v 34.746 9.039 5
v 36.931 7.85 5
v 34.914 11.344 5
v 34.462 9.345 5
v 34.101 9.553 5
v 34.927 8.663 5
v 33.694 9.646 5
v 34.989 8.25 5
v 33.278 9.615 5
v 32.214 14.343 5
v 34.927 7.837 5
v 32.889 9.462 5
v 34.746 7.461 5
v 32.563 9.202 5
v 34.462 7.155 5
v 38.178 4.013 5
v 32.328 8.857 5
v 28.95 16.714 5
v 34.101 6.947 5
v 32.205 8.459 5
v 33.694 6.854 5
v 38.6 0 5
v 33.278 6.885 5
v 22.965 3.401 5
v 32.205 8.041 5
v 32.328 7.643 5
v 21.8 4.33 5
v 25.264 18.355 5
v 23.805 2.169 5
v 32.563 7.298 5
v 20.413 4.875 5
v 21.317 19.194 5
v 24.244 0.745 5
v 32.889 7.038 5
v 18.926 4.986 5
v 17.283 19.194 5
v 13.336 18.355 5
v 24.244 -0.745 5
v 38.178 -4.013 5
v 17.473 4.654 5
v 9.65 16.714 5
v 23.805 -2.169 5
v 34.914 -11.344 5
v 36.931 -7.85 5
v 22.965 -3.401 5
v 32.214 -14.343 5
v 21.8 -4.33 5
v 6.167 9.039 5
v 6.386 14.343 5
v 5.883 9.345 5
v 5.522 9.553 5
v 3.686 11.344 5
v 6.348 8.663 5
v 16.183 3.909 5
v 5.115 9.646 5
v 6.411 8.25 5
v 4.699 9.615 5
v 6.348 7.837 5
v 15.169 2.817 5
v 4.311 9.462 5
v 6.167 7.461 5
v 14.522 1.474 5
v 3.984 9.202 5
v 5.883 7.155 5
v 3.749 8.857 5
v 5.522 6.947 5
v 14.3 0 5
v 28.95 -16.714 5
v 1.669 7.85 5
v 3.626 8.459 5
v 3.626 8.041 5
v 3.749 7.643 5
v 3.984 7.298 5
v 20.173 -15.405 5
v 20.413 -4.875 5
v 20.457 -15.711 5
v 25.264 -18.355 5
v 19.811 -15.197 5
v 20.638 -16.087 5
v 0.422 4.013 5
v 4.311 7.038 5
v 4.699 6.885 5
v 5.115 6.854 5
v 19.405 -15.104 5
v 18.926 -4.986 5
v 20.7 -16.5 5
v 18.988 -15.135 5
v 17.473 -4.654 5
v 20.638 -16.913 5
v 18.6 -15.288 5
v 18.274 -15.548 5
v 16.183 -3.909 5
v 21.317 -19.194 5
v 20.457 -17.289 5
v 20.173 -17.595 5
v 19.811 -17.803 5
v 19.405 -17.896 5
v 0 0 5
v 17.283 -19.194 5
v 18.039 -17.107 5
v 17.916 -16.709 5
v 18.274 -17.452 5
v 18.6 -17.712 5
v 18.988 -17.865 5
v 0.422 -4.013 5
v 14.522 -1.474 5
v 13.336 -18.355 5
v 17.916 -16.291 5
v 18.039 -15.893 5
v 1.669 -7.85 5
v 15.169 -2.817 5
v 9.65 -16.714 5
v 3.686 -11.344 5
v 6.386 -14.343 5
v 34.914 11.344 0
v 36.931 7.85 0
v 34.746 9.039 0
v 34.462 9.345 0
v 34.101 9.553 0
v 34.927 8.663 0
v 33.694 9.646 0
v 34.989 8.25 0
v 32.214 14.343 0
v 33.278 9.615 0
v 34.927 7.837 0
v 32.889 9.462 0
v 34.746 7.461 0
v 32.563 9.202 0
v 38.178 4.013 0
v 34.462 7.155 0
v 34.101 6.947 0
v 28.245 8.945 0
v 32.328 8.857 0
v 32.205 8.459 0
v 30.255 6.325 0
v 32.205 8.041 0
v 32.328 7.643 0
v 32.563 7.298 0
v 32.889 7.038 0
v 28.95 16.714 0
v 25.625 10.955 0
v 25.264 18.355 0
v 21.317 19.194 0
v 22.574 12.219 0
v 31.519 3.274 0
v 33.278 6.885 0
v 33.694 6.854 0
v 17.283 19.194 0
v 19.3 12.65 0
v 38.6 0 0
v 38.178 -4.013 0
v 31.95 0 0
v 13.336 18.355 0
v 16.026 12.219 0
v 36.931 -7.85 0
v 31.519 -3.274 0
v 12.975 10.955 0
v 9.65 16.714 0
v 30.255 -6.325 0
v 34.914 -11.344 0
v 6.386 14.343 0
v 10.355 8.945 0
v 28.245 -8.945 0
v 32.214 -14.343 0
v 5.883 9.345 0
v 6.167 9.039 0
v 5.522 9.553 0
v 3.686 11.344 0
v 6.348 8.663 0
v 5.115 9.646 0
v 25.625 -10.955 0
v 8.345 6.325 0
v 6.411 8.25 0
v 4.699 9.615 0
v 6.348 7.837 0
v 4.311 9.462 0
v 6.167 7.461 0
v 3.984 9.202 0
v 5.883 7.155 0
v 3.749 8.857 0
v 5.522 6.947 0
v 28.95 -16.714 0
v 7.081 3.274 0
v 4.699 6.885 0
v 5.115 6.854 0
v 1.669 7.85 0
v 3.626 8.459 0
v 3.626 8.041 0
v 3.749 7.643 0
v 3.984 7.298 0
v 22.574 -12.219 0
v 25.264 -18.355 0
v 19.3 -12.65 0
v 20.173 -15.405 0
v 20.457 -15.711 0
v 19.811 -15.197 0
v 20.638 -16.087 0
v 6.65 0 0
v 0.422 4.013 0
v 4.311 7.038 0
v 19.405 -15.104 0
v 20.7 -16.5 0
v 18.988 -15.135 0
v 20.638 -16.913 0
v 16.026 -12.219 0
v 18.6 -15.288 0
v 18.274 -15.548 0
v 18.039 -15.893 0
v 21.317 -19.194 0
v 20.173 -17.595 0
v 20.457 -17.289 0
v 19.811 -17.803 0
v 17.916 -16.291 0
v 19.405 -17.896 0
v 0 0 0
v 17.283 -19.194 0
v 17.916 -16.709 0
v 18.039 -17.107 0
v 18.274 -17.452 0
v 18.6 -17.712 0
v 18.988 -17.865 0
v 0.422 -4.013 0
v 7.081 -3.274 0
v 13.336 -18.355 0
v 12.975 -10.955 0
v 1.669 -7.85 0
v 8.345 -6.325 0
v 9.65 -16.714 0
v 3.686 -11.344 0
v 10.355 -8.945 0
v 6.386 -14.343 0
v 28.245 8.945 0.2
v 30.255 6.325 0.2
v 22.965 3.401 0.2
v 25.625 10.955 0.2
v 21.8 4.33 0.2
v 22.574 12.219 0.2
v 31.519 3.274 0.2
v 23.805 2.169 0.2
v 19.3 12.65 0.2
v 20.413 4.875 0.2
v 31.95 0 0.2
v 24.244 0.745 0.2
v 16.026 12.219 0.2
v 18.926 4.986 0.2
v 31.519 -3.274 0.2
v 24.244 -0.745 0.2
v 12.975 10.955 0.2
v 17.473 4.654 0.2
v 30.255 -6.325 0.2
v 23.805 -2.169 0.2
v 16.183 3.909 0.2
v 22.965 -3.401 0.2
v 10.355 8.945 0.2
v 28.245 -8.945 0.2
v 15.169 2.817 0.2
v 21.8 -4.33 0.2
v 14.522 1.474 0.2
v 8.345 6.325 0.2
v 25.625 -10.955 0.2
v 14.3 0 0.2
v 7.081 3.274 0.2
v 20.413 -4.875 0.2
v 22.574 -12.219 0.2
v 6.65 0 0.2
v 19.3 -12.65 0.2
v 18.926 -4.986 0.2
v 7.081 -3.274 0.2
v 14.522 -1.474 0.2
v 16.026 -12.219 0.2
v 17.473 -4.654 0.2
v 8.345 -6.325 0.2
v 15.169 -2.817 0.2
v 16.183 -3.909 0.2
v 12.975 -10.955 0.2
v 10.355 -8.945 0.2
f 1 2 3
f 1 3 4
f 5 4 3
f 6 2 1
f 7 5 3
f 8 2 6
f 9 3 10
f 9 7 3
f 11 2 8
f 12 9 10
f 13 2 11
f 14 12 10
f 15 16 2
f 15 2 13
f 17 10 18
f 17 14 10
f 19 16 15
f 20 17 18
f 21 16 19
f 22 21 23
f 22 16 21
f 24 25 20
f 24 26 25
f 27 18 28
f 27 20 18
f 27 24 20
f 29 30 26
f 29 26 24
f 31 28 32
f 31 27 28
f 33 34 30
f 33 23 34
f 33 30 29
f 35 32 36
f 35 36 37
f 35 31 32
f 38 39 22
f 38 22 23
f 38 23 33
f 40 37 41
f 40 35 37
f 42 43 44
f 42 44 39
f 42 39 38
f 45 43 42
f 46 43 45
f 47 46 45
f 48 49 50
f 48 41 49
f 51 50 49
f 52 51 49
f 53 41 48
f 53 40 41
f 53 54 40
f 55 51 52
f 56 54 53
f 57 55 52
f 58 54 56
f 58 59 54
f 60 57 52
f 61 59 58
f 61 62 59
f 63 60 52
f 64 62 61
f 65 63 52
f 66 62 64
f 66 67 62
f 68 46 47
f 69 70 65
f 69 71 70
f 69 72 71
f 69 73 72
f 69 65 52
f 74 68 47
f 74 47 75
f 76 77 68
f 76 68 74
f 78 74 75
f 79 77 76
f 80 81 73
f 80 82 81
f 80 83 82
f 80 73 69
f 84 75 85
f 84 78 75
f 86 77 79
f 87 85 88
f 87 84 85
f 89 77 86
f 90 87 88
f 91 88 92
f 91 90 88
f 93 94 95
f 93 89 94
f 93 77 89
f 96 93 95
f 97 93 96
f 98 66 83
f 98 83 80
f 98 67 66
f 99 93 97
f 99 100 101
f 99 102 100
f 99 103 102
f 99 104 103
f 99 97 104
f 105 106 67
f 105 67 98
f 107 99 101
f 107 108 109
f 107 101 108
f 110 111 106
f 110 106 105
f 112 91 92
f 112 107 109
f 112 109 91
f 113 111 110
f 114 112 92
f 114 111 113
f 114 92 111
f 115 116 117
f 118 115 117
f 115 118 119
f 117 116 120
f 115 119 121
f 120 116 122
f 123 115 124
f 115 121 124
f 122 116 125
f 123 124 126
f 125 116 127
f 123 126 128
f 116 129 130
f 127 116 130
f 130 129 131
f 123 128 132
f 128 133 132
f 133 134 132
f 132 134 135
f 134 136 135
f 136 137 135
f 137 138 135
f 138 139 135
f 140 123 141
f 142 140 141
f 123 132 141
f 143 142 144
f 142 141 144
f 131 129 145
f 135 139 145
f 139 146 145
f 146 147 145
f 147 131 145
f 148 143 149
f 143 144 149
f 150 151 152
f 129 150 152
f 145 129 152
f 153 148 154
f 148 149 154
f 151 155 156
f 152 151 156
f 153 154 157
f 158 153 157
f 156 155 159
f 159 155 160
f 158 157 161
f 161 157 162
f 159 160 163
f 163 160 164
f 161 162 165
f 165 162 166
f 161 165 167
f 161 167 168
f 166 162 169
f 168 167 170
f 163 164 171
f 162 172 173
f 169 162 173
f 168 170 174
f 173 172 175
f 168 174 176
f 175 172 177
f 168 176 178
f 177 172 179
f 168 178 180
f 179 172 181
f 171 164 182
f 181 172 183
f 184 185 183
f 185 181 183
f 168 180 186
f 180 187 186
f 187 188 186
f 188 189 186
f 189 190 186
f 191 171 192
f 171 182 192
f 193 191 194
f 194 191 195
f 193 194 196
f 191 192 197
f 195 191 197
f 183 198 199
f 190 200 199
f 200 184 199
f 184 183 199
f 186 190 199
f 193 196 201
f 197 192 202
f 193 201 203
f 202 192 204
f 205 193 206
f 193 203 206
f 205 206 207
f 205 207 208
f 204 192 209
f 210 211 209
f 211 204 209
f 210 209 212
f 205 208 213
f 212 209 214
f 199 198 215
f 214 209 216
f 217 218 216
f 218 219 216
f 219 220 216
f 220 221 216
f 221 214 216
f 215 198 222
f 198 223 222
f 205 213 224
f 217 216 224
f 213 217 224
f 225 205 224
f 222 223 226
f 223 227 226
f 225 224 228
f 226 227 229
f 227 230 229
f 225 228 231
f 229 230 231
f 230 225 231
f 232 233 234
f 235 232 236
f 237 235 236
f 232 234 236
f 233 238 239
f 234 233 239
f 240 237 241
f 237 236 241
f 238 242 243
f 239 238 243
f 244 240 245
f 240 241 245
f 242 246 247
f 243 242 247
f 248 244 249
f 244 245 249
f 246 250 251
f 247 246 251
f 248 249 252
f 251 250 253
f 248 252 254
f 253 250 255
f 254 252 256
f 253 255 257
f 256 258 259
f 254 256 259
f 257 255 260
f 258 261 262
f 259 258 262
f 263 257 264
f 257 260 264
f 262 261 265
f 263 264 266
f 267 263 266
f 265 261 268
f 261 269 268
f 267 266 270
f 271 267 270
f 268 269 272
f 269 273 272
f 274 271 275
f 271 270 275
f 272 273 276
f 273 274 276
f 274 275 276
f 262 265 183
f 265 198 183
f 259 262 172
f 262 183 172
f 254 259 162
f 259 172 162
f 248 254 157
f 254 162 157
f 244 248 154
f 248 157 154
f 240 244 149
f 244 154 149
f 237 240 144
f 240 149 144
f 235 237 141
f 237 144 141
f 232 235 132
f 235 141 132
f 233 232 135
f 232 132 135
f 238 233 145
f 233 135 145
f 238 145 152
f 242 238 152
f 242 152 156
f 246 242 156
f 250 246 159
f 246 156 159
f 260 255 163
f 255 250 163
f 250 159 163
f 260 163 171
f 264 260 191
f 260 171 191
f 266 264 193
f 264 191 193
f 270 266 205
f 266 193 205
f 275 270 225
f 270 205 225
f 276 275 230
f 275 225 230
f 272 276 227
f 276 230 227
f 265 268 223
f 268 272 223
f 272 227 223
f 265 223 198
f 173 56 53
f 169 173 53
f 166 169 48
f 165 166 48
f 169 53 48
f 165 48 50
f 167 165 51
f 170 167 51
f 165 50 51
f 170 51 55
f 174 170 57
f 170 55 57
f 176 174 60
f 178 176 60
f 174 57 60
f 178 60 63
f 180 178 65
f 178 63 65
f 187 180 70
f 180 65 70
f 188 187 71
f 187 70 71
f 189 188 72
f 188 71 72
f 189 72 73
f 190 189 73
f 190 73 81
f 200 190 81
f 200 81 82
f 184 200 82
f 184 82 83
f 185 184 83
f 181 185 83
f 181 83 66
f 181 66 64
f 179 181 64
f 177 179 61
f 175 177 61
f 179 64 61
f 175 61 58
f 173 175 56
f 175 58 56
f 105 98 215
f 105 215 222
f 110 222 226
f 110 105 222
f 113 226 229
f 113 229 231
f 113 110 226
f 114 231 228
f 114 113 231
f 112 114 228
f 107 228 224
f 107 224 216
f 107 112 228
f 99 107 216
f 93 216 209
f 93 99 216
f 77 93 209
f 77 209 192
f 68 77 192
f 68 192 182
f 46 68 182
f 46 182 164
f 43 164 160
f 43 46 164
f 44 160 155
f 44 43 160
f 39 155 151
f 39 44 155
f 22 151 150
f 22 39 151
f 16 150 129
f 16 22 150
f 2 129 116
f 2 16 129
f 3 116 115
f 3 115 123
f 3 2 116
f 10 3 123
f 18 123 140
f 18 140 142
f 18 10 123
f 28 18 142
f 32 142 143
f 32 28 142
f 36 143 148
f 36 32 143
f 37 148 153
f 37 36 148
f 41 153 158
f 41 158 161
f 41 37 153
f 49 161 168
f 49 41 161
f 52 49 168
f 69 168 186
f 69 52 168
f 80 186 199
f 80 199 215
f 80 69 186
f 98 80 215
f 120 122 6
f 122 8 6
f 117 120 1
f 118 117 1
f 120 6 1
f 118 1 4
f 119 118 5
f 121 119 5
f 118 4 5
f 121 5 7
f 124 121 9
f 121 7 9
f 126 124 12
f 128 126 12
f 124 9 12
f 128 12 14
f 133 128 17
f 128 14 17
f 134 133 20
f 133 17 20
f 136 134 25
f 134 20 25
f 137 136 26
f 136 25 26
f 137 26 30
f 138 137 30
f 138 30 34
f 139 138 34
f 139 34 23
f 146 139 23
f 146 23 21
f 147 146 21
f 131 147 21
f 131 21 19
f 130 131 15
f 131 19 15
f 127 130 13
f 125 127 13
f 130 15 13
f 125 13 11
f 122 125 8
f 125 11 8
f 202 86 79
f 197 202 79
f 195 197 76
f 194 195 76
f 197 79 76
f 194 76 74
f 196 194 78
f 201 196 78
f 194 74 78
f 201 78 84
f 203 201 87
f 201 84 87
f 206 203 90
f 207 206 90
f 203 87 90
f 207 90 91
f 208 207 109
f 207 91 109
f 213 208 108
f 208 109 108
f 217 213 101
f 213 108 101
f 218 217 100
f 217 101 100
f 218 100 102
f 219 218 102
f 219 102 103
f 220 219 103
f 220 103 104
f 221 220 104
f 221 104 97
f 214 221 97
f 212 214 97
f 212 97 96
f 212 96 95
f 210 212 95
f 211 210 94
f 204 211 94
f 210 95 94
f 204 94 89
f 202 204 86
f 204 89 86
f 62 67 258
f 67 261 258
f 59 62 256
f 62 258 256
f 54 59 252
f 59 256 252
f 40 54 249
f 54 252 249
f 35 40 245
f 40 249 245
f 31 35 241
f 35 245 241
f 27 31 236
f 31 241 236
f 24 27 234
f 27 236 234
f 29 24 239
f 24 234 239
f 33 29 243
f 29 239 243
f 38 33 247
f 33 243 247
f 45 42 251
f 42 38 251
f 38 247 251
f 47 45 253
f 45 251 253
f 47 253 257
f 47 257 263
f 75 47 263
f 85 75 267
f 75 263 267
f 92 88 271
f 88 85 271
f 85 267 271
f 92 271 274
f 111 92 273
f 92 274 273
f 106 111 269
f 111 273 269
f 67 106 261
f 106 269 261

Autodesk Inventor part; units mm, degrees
ref_plane "YZ Plane" through (0, 0, 0) normal (1, 0, 0) x (0, 1, 0)
ref_plane "XZ Plane" through (0, 0, 0) normal (0, 1, 0) x (-1, 0, 0)
ref_plane "XY Plane" through (0, 0, 0) normal (0, 0, 1) x (1, 0, 0)
sketch "Skizze1" plane through (0, 0, 0) normal (0, 1, 0) x (-1, 0, 0)
  line L0 (-3.6106, 0) -> (-3.6106, -12.505)
  line L1 (-38.6, 0) -> (0, 0) projected
  line L2 (-13.05, -7.505) -> (-13.05, -21.905) projected
  line L3 (-25.55, -7.505) -> (-25.55, -21.905) projected
  line L4 (-6.3, -0.4913) -> (-6.3, 0)
  line L5 (-32.3, -0.4913) -> (-6.3, -0.4913) projected
  line L6 (0, 0) -> (0, 5)
  line L7 (0, 5) -> (-14.3, 5)
  line L8 (-14.3, 5) -> (-14.3, 0.2)
  line L9 (-14.3, 0.2) -> (-6.65, 0.2)
  line L10 (-6.65, 0.2) -> (-6.65, 0)
  line L11 (0, 0) -> (-6.65, 0)
  line L12 (-19.3, -19.905) -> (-19.3, 13.9284)
  dimension "d0" = 5
  dimension "d1" = 12.65
  dimension "d2" = 12.5
  dimension "d3" = 6.25
  dimension "d4" = 0.2
  dimension "d6" = 5
revolve "Umdrehung1" add sketch "Skizze1" angle 360 about axis through (19.3, 0, -19.905) along (0, 0, 1) contours L10 L9 L8 L7 L6 L1
sketch "Skizze2" plane through (19.3, 0, 5) normal (0, 0, 1) x (1, 0, 0)
  circle A0 centre (0, -16.5) radius 1.4 projected
  circle A1 centre (0, 0) radius 19.3 projected
  circle A2 centre (0, 0) radius 12.65 projected
  circle A3 centre (-14.2894, 8.25) radius 1.4 projected
  circle A4 centre (14.2894, 8.25) radius 1.4 projected
  point P0 (-19.3, 0)
extrude "Extrusion1" cut sketch "Skizze2" against normal through all contours A0 | A3 | A4
equation "\"d3\" = 0.5 * d2"
properties part number "50_ETL_Lid_v0"
